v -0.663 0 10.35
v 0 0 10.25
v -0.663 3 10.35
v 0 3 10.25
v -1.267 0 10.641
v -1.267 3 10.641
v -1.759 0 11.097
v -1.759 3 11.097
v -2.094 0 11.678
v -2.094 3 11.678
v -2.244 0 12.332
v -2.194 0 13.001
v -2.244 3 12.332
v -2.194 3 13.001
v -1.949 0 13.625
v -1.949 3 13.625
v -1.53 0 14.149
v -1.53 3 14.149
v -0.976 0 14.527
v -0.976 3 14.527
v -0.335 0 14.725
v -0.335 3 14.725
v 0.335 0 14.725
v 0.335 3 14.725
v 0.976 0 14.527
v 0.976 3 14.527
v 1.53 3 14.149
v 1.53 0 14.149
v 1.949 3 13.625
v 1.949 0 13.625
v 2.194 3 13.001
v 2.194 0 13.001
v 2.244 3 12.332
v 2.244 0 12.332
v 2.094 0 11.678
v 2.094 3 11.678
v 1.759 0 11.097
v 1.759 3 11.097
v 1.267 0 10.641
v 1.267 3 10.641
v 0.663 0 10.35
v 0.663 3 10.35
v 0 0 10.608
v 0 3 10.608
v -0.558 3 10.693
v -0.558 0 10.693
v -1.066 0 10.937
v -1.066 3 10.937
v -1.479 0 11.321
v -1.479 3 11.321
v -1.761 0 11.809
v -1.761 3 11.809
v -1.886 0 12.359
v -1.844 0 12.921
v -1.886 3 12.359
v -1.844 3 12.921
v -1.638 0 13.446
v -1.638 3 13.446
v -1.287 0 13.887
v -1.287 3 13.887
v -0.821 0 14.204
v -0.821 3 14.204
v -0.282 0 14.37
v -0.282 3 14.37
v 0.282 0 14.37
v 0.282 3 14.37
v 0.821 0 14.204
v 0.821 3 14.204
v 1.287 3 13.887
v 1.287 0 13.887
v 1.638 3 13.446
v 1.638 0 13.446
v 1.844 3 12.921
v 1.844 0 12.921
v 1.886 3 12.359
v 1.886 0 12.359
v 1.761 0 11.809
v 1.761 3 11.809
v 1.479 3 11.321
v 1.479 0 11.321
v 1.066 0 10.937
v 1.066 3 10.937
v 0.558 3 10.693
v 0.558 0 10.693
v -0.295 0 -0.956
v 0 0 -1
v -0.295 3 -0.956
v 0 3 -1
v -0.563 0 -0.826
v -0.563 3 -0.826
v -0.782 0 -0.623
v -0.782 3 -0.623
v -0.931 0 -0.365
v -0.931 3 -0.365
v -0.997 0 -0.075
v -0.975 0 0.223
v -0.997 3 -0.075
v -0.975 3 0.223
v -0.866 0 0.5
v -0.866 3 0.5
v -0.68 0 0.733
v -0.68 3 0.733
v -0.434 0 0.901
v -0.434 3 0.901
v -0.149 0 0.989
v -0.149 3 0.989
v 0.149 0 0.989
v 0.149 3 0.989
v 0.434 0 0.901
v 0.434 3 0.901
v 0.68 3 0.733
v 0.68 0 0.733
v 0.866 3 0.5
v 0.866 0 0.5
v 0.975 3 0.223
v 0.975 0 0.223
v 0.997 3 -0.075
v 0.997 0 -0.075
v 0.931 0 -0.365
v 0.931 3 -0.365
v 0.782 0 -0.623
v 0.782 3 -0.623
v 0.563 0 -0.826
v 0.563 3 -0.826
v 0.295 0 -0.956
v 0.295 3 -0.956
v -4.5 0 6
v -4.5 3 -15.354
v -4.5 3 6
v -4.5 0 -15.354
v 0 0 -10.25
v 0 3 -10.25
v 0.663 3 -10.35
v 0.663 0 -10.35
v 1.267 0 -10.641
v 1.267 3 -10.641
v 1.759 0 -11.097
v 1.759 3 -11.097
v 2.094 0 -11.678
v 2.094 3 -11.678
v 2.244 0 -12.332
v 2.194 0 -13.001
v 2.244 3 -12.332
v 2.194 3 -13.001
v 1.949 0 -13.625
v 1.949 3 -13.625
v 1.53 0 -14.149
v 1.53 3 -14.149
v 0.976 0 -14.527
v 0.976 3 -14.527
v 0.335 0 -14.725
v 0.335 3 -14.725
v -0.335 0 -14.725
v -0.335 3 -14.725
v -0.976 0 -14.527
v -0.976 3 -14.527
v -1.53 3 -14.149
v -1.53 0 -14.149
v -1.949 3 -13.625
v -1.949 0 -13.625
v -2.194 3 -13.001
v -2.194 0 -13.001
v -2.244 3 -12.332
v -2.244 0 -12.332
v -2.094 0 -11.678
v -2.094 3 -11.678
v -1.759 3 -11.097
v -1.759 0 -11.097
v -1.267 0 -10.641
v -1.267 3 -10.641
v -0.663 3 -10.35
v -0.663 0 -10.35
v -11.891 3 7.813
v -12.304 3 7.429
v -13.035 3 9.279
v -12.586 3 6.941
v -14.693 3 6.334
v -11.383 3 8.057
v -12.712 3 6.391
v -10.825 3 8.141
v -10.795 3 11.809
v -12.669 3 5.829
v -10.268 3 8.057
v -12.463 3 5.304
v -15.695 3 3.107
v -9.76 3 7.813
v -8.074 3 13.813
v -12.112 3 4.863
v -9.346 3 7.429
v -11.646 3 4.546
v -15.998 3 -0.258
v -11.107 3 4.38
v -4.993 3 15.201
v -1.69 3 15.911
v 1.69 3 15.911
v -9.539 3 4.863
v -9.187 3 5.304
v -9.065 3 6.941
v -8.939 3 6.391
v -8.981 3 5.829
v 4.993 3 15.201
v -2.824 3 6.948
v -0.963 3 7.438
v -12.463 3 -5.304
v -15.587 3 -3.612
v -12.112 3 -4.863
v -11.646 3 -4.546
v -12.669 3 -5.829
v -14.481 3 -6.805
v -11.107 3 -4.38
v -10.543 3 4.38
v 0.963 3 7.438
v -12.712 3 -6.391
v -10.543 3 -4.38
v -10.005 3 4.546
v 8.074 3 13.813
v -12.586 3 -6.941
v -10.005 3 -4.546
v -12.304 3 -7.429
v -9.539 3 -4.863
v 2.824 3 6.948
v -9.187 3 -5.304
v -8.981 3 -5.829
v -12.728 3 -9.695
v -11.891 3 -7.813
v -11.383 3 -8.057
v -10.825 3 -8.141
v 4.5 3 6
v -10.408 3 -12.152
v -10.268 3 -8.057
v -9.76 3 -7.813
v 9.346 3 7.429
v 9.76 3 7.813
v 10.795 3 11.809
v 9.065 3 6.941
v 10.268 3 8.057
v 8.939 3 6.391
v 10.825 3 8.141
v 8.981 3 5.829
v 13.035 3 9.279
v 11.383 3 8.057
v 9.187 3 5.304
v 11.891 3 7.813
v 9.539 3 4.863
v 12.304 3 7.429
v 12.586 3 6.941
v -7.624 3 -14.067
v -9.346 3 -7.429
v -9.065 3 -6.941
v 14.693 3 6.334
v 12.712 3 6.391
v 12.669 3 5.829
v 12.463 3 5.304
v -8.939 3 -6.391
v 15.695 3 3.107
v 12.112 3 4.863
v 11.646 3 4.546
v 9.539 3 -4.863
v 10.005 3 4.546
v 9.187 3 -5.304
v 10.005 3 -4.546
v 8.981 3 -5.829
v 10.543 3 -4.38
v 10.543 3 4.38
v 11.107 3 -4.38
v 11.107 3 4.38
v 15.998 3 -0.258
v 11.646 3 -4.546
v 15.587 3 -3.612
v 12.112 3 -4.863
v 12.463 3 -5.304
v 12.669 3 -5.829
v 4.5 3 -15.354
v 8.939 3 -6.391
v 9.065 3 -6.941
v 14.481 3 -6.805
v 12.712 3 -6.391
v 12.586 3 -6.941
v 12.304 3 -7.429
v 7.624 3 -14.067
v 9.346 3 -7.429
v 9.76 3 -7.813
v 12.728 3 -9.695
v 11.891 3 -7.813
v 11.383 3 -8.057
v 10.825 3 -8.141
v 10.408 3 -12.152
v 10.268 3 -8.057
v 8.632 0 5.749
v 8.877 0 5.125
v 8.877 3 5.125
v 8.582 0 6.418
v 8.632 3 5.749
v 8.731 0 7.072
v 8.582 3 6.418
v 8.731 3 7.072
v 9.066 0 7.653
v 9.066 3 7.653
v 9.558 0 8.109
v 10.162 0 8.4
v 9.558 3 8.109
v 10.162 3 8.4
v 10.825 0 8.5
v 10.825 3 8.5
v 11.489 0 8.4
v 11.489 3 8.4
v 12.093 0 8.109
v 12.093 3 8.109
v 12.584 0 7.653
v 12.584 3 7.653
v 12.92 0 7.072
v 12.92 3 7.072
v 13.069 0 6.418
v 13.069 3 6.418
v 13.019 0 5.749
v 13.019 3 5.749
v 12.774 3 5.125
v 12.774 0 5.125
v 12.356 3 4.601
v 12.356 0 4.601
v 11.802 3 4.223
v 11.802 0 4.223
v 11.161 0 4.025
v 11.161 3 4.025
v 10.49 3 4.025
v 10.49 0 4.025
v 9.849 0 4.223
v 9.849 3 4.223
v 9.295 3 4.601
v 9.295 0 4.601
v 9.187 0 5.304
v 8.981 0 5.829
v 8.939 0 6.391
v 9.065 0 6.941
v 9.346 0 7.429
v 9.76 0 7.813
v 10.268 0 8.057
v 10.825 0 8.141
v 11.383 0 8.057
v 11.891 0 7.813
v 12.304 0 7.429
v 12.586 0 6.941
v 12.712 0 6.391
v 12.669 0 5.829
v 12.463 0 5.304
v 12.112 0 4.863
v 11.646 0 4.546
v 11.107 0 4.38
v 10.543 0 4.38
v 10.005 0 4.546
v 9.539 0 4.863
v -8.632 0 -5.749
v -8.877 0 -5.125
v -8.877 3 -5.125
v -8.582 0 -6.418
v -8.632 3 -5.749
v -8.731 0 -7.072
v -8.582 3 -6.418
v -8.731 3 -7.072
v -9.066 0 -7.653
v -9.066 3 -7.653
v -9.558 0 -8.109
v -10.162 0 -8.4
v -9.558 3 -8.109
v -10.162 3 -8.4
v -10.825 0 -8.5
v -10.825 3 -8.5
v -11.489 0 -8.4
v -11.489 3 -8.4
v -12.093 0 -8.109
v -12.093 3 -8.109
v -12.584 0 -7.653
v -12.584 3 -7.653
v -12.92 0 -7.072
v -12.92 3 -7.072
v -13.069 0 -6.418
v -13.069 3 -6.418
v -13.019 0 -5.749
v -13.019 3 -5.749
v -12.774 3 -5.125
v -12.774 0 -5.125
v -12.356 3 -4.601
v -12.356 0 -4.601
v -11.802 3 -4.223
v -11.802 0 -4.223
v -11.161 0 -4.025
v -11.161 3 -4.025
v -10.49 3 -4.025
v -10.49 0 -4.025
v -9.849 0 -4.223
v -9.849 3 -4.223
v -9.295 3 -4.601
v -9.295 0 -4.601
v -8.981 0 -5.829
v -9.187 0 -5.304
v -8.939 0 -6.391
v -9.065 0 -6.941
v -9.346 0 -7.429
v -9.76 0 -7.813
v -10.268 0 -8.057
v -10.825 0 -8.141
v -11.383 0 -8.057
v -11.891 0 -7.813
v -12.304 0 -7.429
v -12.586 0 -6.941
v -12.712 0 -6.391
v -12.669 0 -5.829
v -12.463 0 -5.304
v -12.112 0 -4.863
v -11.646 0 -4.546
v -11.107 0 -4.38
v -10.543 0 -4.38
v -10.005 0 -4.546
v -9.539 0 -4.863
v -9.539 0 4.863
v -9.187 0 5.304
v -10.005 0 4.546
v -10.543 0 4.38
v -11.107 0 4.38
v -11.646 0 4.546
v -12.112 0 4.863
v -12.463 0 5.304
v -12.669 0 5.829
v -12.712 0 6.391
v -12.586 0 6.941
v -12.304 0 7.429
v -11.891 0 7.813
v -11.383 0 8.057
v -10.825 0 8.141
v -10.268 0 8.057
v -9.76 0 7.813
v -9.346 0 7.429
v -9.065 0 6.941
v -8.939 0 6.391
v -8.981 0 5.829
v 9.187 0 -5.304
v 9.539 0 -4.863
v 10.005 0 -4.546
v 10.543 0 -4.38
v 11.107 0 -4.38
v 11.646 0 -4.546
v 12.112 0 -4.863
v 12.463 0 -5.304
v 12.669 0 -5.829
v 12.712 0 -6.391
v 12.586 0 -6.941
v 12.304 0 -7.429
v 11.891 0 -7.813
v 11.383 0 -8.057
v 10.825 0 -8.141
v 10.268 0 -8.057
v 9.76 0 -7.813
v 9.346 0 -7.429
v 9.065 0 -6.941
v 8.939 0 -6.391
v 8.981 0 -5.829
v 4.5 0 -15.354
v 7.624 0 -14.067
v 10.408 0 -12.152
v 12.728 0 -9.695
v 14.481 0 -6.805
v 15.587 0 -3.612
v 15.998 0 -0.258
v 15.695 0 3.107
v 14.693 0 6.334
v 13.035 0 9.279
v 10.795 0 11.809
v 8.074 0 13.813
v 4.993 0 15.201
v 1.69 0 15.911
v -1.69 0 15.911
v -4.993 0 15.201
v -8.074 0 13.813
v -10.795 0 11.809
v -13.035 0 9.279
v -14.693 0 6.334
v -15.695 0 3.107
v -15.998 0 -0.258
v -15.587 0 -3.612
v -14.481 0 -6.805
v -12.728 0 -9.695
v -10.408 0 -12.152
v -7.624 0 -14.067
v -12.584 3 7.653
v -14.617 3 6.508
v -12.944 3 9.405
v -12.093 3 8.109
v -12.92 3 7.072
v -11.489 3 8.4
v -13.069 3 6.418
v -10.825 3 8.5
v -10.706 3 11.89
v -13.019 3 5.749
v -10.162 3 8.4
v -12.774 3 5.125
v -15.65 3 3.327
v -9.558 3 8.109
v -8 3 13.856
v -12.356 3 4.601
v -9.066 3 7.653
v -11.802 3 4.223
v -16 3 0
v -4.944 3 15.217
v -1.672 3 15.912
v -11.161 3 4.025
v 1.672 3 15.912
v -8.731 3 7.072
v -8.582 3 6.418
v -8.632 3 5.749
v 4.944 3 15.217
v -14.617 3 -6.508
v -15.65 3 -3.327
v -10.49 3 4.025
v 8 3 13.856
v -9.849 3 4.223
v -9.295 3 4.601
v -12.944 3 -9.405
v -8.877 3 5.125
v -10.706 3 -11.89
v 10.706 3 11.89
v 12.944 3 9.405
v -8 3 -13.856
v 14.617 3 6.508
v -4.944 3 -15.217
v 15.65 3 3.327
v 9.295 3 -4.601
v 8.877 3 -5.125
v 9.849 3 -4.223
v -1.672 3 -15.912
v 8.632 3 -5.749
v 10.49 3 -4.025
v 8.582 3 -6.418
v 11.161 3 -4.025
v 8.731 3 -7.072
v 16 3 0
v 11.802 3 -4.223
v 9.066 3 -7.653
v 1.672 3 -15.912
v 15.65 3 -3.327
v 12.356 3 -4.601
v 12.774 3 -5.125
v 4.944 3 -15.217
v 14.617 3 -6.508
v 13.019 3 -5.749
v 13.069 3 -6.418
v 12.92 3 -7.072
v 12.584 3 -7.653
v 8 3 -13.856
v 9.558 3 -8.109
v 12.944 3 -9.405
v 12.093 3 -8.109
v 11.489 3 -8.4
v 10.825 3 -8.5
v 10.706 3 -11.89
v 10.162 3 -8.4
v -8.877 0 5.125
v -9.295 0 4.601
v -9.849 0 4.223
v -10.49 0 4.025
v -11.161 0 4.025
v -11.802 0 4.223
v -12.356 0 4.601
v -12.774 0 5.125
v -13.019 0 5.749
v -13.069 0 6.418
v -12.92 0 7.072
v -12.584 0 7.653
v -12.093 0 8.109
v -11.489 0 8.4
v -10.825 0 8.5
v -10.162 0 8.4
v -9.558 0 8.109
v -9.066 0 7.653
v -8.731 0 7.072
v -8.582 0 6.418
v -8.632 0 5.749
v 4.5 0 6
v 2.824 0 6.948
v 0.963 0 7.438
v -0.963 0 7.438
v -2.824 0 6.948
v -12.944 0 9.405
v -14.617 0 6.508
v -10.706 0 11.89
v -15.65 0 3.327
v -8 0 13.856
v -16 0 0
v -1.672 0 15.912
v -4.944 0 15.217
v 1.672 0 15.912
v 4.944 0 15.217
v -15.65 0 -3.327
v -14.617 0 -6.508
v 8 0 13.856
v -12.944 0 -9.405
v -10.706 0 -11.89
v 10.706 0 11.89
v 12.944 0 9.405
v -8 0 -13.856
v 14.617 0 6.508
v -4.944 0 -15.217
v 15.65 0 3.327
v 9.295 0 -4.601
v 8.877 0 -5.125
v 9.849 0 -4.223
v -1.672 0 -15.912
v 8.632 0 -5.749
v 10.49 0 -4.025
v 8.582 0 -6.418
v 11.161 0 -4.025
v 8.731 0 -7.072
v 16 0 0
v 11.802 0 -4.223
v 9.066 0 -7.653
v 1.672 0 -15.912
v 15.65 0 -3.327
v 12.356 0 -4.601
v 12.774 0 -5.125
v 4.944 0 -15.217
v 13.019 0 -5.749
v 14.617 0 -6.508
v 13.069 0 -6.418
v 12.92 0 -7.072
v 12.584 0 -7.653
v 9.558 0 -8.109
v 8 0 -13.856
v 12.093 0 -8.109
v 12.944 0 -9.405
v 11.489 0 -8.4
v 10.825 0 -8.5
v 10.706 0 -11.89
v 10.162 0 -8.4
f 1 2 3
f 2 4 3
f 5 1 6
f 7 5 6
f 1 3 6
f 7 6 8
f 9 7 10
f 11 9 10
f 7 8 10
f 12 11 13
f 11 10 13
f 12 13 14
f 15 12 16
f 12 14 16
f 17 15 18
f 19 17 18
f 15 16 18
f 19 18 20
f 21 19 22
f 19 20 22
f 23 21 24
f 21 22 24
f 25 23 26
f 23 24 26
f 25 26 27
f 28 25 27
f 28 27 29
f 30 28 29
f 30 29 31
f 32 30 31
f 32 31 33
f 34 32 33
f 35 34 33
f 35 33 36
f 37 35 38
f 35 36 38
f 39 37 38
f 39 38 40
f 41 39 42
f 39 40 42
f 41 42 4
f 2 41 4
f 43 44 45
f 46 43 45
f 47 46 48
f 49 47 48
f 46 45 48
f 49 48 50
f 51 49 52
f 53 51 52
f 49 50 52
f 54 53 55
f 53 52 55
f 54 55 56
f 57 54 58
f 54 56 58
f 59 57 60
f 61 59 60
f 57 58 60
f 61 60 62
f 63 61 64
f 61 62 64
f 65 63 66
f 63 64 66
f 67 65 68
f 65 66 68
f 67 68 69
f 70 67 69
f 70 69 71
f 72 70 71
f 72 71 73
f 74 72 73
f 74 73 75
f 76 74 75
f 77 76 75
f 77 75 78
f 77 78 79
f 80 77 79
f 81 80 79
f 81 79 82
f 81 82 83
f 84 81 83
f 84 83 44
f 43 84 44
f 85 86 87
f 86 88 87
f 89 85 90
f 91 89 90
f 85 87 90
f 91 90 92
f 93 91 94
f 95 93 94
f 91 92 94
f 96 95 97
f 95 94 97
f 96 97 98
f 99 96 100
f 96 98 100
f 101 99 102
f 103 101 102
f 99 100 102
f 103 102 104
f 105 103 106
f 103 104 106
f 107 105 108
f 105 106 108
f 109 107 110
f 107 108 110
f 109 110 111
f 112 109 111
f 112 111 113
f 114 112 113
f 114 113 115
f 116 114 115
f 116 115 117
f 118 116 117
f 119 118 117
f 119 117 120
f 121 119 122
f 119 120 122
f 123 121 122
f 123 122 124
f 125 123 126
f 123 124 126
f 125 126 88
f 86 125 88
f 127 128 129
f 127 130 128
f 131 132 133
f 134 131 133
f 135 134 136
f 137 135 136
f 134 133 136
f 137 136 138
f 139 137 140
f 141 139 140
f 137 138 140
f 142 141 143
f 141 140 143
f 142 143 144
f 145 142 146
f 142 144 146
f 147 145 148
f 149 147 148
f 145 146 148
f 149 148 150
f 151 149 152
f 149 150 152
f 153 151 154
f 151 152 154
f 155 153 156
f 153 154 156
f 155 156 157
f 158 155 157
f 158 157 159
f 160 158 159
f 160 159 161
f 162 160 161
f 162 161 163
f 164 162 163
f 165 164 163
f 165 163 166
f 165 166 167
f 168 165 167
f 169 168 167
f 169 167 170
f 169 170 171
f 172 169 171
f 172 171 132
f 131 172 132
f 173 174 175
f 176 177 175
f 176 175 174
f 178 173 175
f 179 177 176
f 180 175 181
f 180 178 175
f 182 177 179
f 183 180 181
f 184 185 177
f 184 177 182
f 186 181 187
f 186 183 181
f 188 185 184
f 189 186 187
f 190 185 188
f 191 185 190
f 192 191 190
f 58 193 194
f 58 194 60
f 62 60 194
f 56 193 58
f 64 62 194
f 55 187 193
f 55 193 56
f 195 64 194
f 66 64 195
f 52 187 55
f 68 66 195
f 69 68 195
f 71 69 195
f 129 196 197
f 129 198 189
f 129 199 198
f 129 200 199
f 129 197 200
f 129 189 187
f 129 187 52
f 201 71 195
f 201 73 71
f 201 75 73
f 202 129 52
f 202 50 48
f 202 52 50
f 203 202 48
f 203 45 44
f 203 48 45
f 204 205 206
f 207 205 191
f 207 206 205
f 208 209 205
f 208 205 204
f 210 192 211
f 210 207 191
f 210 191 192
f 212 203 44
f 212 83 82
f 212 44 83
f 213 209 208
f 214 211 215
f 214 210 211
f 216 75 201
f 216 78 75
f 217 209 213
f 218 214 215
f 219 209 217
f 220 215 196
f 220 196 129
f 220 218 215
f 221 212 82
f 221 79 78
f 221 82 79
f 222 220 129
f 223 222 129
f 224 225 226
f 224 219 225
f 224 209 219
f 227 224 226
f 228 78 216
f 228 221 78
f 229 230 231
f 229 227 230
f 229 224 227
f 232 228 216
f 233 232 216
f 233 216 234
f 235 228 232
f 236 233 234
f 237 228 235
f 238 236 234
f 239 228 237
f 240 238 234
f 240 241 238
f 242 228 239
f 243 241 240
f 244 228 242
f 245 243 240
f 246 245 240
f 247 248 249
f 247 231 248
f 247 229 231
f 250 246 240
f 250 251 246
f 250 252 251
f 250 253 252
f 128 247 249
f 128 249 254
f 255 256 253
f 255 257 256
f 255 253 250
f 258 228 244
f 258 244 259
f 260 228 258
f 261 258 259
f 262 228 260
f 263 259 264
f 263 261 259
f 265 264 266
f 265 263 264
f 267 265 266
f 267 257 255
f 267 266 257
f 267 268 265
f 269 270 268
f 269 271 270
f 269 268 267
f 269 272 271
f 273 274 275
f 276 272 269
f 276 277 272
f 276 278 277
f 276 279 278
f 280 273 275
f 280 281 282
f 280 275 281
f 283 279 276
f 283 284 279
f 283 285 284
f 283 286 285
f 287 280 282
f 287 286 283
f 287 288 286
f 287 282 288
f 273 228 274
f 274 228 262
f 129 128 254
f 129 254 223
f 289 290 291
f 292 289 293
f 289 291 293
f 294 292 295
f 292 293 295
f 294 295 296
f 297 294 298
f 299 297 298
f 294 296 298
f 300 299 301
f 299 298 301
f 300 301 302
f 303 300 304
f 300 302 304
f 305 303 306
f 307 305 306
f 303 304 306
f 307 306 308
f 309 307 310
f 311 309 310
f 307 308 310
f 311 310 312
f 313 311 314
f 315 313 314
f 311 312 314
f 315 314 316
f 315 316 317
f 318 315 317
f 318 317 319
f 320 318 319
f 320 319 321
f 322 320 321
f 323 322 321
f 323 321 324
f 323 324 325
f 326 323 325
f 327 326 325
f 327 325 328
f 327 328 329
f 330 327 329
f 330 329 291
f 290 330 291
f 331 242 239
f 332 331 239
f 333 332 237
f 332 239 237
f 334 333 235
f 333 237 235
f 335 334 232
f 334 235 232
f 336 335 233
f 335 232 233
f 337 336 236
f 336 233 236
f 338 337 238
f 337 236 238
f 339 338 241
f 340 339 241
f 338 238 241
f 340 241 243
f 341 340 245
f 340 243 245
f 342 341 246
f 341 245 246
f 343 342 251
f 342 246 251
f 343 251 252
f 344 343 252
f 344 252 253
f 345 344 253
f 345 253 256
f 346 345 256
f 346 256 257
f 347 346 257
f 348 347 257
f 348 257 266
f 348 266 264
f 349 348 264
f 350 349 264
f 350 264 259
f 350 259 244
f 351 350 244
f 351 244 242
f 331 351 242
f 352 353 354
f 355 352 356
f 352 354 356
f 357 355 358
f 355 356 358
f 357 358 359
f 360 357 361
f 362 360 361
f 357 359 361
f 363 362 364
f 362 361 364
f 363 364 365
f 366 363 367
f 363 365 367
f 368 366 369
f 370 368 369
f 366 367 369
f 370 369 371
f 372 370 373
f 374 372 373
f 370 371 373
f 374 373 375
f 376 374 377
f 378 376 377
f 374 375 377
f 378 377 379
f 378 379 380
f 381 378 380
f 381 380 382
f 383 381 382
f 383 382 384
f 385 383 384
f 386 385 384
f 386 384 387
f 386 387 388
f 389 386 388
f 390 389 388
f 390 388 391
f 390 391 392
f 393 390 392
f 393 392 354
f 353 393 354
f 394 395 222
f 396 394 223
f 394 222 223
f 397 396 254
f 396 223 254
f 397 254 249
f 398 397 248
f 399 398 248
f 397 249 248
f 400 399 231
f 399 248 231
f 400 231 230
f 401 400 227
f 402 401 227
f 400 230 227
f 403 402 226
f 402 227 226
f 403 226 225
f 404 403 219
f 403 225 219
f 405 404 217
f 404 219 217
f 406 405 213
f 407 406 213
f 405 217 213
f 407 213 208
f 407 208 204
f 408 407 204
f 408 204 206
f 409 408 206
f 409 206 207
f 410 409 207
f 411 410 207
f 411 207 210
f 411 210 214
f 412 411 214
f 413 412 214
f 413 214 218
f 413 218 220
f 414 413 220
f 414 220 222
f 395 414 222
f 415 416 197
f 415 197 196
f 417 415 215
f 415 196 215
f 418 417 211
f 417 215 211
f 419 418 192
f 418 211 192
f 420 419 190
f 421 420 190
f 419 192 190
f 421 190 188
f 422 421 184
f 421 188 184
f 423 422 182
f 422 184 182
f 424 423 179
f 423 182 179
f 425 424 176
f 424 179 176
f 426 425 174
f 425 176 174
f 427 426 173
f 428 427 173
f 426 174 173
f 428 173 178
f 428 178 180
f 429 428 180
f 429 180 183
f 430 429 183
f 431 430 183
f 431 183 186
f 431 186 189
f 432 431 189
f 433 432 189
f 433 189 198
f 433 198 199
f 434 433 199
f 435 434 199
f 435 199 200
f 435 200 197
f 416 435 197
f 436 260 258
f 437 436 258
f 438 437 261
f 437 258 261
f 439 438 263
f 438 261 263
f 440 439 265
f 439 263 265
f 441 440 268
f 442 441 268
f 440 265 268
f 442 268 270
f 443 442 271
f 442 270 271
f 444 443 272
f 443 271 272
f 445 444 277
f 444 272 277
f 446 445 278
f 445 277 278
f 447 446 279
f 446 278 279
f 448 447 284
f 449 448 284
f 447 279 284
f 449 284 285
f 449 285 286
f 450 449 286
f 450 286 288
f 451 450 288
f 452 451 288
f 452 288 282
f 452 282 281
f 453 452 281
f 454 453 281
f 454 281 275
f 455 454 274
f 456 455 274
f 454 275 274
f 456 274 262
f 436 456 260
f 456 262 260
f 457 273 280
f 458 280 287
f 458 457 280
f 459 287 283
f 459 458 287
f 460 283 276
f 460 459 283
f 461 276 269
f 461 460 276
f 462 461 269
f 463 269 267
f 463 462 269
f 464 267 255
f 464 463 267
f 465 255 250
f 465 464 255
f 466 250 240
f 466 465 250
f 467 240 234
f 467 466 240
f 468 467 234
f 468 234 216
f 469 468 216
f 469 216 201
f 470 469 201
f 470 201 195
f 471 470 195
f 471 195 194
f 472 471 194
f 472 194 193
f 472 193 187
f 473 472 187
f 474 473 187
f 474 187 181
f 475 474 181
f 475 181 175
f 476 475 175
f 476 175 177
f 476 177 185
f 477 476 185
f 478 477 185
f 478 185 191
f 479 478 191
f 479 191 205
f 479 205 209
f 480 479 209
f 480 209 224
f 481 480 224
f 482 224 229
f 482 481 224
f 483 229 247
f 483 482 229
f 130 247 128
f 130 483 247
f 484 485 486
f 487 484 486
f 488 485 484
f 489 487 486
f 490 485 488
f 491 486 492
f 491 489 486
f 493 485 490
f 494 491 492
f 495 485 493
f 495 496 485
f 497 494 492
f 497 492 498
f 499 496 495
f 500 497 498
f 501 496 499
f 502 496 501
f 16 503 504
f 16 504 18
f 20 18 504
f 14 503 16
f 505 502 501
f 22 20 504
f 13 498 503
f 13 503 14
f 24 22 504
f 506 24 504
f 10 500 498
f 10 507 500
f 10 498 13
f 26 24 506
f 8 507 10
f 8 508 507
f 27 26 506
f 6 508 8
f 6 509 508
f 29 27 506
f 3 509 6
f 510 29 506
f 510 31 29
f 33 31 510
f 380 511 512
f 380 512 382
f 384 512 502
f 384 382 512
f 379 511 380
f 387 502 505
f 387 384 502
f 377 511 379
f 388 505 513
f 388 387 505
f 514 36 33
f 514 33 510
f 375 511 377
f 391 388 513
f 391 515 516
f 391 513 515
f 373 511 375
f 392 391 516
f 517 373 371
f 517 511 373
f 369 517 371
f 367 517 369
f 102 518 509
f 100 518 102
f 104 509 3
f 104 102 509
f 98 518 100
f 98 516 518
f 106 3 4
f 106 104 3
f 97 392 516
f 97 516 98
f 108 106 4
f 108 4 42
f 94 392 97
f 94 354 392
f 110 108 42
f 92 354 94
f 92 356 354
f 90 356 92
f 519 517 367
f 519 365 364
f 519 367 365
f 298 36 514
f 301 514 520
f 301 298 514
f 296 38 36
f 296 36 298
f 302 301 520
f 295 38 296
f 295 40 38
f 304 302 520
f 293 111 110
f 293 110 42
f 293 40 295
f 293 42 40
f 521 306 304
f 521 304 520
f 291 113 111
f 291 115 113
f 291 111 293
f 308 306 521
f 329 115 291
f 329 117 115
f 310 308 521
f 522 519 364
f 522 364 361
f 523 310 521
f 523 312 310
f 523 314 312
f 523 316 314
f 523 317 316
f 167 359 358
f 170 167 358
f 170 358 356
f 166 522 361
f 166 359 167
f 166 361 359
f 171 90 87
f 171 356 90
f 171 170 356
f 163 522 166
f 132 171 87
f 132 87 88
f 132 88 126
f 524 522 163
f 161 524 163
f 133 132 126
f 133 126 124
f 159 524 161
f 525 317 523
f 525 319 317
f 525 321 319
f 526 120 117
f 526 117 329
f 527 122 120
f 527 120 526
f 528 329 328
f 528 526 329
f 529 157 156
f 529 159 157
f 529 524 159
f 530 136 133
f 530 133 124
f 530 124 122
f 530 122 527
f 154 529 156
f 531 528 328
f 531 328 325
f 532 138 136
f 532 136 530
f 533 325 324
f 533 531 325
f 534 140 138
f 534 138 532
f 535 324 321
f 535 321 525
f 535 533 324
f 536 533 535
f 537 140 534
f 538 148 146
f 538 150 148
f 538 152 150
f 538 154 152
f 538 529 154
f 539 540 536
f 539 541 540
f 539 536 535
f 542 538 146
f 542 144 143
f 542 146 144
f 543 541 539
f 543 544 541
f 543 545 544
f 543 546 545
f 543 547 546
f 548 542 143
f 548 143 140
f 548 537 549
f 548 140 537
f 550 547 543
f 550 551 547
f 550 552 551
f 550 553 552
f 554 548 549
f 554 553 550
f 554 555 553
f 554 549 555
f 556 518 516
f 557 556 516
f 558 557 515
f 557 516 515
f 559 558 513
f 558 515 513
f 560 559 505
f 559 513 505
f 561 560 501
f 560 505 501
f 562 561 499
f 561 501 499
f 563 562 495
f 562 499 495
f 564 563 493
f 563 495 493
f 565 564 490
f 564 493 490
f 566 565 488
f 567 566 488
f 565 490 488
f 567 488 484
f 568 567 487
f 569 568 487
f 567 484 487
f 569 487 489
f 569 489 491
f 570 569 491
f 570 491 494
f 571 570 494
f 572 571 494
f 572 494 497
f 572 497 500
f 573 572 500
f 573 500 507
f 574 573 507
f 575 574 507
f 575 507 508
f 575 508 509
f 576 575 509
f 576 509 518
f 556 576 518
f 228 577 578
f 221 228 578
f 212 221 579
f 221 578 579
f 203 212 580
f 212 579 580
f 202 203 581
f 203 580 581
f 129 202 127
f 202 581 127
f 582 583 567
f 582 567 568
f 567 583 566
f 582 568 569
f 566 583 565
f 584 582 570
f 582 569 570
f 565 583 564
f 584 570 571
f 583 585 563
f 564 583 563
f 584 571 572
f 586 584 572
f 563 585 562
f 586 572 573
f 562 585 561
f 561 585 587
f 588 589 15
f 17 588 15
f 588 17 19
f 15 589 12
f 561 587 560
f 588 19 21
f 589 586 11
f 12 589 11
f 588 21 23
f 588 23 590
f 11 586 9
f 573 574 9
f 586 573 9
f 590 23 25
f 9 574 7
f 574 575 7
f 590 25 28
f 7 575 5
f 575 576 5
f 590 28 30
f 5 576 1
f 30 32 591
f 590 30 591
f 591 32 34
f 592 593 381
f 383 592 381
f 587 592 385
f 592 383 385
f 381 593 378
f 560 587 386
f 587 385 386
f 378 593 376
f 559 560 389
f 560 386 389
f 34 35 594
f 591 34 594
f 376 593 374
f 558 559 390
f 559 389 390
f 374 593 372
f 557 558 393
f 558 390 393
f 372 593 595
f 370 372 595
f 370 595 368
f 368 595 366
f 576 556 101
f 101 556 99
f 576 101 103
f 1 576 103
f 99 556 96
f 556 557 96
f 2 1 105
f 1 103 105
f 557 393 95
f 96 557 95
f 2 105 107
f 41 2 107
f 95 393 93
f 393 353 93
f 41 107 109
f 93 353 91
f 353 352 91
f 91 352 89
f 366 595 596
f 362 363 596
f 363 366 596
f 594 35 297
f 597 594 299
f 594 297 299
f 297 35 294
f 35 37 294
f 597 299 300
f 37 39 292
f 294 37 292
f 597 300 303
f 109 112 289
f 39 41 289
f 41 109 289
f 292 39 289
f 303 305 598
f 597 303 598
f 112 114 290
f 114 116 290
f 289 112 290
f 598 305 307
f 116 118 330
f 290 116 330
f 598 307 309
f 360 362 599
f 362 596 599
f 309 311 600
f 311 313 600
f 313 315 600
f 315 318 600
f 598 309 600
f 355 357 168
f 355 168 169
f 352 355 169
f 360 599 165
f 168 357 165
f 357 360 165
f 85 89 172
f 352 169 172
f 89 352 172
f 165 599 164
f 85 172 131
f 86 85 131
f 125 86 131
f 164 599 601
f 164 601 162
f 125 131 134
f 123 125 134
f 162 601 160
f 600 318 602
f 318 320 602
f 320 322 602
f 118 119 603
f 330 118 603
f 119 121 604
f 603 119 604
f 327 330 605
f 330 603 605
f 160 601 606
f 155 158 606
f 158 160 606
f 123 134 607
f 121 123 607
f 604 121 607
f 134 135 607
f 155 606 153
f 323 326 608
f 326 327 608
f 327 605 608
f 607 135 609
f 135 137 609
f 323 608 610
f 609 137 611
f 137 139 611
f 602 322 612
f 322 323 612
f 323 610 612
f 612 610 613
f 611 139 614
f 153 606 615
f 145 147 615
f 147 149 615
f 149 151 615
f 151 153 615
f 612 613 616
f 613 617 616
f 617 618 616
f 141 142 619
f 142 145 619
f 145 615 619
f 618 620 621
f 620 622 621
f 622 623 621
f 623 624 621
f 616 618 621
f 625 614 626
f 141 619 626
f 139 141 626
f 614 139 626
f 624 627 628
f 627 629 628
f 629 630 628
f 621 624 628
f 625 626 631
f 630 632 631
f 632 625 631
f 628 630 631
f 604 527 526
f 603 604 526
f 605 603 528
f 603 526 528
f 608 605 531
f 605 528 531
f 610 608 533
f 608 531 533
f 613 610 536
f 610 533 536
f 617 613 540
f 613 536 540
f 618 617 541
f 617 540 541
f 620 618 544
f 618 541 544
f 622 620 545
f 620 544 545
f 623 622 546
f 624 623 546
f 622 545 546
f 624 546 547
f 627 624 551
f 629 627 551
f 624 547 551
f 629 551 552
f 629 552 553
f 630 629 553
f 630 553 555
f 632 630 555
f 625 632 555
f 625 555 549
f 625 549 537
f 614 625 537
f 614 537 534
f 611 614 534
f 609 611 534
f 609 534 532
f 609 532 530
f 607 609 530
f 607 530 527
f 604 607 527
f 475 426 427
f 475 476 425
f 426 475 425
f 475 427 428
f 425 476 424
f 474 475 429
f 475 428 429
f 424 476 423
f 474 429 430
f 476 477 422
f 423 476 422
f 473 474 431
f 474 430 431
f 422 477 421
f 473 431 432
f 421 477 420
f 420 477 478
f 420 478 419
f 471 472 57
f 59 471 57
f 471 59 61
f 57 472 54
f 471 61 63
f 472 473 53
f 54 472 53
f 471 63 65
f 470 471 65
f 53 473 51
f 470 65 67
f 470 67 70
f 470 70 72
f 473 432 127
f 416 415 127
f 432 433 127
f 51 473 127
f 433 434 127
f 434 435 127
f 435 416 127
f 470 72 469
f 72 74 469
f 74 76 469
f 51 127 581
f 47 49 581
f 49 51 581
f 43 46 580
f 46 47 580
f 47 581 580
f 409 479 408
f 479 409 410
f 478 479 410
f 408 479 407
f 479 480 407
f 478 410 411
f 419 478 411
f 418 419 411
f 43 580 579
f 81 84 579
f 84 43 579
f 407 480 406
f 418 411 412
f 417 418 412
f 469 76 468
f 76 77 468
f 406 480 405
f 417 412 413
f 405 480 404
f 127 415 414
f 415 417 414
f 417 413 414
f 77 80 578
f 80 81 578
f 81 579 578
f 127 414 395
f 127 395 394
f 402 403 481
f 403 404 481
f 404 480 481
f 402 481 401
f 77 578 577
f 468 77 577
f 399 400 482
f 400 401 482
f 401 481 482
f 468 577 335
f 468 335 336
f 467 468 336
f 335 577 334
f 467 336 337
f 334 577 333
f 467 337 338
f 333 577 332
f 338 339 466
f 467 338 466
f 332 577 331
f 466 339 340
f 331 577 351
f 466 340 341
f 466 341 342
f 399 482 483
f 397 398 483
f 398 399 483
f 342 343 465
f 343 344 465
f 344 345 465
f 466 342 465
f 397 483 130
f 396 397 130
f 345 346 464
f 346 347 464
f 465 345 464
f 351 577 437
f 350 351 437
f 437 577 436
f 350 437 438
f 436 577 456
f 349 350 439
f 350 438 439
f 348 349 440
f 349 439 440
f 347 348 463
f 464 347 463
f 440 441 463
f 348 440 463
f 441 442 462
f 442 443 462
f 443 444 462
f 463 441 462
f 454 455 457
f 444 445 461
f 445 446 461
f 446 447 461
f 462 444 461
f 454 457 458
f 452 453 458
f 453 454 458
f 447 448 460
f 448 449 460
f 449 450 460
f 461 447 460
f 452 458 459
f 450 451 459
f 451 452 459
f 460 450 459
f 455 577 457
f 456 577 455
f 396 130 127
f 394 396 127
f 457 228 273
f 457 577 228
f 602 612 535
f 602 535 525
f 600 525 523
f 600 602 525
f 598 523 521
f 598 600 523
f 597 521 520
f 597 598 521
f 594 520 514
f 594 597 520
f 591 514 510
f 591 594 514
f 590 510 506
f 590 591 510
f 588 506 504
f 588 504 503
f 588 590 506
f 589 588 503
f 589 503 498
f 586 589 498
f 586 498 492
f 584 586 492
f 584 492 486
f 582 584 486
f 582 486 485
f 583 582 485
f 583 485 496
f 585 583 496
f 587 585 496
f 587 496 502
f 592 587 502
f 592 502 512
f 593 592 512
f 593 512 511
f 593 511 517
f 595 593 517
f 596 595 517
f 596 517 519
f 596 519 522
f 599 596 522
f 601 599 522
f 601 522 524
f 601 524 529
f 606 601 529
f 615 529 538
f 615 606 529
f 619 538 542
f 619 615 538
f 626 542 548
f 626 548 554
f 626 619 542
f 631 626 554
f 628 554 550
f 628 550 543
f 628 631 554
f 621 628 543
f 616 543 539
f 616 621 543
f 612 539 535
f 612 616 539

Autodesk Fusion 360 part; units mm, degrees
sketch "Sketch1" plane through (0, 0, 0) normal (0, 1, 0) x (1, 0, 0)
  circle A0 centre (0, 0) radius 16
  circle A1 centre (0, 0) radius 7.5
  line L0 (-4.5, 15.3542) -> (-4.5, -6)
  line L1 (4.5, -6) -> (4.5, 15.3542)
  circle A2 centre (0, 0) radius 12.5 construction
  point P0 (0, -12.5)
  dimension "d1" = 32
  dimension "d2" = 15
  dimension "d3" = 9
  dimension "d4" = 25
extrude "Extrude1" add sketch "Sketch1" along normal blind 3 contours A0 A1 L0 L1 | A1 L1 | A1 L0 picked at (10.3483, -8.0939) makes body 1
hole "Hole1" at (0, 0, 12.5) direction (0, 1, 0) diameter 3.783 end through all bodies 1 1
pattern_circular "C-Pattern1" count 6 over 360 about axis through (0, 1.75, 0) along (0, 1, 0) of "Hole1"
extrude "Extrude2" add sketch "Sketch1" along normal blind 3 separate body makes body 2
hole "Hole2" at (0, 0, 12.5) direction (0, 1, 0) diameter 4.5 depth 3 tip angle 118 bodies 2
pattern_circular "C-Pattern2" count 6 over 360 about axis through (0, 1.75, 0) along (0, 1, 0) of "Hole2"
hole "Hole3" at (0, 0, 0) direction (0, 1, 0) diameter 2 end through all bodies 2 2
copy_body "Body->Comp1" bodies 1 removing the originals makes body 3 in component "LC"
copy_body "Body->Comp2" bodies 2 removing the originals makes body 4 in component "UC"
sketch "Sketch2" plane through (0, 3, 0) normal (0, 1, 0) x (-1, 0, 0)
  circle A0 centre (0, 0) radius 1
  circle A1 centre (10.8253, 6.25) radius 2.25
  circle A2 centre (10.8253, -6.25) radius 2.25
  circle A3 centre (0, -12.5) radius 2.25
  circle A4 centre (-10.8253, -6.25) radius 2.25
  circle A5 centre (-10.8253, 6.25) radius 2.25
  circle A6 centre (0, 12.5) radius 2.25
  circle A7 centre (0, 0) radius 16
sketch "Sketch3" plane through (0, 3, 0) normal (0, 1, 0) x (-1, 0, 0)
  circle A0 centre (10.8253, 6.25) radius 1.8916
  circle A1 centre (10.8253, -6.25) radius 1.8916
  circle A2 centre (-10.8253, -6.25) radius 1.8915
  circle A3 centre (-10.8253, 6.25) radius 1.8915
  circle A4 centre (0, 12.5) radius 1.8916
  arc A5 (4.5, -15.3542) -> (-4.5, -15.3542) centre (0, 0) ccw
  line L0 (-4.5, -15.3542) -> (-4.5, 6)
  arc A6 (4.5, 6) -> (-4.5, 6) centre (0, 0) ccw
  line L1 (4.5, 6) -> (4.5, -15.3542)
component "LC" placed x (1, 0, 0) y (0, 1, 0) z (0, 0, 1) at (0, 0, 0)
component "UC" placed x (1, 0, 0) y (0, 1, 0) z (0, 0, 1) at (0, 0, 0)
